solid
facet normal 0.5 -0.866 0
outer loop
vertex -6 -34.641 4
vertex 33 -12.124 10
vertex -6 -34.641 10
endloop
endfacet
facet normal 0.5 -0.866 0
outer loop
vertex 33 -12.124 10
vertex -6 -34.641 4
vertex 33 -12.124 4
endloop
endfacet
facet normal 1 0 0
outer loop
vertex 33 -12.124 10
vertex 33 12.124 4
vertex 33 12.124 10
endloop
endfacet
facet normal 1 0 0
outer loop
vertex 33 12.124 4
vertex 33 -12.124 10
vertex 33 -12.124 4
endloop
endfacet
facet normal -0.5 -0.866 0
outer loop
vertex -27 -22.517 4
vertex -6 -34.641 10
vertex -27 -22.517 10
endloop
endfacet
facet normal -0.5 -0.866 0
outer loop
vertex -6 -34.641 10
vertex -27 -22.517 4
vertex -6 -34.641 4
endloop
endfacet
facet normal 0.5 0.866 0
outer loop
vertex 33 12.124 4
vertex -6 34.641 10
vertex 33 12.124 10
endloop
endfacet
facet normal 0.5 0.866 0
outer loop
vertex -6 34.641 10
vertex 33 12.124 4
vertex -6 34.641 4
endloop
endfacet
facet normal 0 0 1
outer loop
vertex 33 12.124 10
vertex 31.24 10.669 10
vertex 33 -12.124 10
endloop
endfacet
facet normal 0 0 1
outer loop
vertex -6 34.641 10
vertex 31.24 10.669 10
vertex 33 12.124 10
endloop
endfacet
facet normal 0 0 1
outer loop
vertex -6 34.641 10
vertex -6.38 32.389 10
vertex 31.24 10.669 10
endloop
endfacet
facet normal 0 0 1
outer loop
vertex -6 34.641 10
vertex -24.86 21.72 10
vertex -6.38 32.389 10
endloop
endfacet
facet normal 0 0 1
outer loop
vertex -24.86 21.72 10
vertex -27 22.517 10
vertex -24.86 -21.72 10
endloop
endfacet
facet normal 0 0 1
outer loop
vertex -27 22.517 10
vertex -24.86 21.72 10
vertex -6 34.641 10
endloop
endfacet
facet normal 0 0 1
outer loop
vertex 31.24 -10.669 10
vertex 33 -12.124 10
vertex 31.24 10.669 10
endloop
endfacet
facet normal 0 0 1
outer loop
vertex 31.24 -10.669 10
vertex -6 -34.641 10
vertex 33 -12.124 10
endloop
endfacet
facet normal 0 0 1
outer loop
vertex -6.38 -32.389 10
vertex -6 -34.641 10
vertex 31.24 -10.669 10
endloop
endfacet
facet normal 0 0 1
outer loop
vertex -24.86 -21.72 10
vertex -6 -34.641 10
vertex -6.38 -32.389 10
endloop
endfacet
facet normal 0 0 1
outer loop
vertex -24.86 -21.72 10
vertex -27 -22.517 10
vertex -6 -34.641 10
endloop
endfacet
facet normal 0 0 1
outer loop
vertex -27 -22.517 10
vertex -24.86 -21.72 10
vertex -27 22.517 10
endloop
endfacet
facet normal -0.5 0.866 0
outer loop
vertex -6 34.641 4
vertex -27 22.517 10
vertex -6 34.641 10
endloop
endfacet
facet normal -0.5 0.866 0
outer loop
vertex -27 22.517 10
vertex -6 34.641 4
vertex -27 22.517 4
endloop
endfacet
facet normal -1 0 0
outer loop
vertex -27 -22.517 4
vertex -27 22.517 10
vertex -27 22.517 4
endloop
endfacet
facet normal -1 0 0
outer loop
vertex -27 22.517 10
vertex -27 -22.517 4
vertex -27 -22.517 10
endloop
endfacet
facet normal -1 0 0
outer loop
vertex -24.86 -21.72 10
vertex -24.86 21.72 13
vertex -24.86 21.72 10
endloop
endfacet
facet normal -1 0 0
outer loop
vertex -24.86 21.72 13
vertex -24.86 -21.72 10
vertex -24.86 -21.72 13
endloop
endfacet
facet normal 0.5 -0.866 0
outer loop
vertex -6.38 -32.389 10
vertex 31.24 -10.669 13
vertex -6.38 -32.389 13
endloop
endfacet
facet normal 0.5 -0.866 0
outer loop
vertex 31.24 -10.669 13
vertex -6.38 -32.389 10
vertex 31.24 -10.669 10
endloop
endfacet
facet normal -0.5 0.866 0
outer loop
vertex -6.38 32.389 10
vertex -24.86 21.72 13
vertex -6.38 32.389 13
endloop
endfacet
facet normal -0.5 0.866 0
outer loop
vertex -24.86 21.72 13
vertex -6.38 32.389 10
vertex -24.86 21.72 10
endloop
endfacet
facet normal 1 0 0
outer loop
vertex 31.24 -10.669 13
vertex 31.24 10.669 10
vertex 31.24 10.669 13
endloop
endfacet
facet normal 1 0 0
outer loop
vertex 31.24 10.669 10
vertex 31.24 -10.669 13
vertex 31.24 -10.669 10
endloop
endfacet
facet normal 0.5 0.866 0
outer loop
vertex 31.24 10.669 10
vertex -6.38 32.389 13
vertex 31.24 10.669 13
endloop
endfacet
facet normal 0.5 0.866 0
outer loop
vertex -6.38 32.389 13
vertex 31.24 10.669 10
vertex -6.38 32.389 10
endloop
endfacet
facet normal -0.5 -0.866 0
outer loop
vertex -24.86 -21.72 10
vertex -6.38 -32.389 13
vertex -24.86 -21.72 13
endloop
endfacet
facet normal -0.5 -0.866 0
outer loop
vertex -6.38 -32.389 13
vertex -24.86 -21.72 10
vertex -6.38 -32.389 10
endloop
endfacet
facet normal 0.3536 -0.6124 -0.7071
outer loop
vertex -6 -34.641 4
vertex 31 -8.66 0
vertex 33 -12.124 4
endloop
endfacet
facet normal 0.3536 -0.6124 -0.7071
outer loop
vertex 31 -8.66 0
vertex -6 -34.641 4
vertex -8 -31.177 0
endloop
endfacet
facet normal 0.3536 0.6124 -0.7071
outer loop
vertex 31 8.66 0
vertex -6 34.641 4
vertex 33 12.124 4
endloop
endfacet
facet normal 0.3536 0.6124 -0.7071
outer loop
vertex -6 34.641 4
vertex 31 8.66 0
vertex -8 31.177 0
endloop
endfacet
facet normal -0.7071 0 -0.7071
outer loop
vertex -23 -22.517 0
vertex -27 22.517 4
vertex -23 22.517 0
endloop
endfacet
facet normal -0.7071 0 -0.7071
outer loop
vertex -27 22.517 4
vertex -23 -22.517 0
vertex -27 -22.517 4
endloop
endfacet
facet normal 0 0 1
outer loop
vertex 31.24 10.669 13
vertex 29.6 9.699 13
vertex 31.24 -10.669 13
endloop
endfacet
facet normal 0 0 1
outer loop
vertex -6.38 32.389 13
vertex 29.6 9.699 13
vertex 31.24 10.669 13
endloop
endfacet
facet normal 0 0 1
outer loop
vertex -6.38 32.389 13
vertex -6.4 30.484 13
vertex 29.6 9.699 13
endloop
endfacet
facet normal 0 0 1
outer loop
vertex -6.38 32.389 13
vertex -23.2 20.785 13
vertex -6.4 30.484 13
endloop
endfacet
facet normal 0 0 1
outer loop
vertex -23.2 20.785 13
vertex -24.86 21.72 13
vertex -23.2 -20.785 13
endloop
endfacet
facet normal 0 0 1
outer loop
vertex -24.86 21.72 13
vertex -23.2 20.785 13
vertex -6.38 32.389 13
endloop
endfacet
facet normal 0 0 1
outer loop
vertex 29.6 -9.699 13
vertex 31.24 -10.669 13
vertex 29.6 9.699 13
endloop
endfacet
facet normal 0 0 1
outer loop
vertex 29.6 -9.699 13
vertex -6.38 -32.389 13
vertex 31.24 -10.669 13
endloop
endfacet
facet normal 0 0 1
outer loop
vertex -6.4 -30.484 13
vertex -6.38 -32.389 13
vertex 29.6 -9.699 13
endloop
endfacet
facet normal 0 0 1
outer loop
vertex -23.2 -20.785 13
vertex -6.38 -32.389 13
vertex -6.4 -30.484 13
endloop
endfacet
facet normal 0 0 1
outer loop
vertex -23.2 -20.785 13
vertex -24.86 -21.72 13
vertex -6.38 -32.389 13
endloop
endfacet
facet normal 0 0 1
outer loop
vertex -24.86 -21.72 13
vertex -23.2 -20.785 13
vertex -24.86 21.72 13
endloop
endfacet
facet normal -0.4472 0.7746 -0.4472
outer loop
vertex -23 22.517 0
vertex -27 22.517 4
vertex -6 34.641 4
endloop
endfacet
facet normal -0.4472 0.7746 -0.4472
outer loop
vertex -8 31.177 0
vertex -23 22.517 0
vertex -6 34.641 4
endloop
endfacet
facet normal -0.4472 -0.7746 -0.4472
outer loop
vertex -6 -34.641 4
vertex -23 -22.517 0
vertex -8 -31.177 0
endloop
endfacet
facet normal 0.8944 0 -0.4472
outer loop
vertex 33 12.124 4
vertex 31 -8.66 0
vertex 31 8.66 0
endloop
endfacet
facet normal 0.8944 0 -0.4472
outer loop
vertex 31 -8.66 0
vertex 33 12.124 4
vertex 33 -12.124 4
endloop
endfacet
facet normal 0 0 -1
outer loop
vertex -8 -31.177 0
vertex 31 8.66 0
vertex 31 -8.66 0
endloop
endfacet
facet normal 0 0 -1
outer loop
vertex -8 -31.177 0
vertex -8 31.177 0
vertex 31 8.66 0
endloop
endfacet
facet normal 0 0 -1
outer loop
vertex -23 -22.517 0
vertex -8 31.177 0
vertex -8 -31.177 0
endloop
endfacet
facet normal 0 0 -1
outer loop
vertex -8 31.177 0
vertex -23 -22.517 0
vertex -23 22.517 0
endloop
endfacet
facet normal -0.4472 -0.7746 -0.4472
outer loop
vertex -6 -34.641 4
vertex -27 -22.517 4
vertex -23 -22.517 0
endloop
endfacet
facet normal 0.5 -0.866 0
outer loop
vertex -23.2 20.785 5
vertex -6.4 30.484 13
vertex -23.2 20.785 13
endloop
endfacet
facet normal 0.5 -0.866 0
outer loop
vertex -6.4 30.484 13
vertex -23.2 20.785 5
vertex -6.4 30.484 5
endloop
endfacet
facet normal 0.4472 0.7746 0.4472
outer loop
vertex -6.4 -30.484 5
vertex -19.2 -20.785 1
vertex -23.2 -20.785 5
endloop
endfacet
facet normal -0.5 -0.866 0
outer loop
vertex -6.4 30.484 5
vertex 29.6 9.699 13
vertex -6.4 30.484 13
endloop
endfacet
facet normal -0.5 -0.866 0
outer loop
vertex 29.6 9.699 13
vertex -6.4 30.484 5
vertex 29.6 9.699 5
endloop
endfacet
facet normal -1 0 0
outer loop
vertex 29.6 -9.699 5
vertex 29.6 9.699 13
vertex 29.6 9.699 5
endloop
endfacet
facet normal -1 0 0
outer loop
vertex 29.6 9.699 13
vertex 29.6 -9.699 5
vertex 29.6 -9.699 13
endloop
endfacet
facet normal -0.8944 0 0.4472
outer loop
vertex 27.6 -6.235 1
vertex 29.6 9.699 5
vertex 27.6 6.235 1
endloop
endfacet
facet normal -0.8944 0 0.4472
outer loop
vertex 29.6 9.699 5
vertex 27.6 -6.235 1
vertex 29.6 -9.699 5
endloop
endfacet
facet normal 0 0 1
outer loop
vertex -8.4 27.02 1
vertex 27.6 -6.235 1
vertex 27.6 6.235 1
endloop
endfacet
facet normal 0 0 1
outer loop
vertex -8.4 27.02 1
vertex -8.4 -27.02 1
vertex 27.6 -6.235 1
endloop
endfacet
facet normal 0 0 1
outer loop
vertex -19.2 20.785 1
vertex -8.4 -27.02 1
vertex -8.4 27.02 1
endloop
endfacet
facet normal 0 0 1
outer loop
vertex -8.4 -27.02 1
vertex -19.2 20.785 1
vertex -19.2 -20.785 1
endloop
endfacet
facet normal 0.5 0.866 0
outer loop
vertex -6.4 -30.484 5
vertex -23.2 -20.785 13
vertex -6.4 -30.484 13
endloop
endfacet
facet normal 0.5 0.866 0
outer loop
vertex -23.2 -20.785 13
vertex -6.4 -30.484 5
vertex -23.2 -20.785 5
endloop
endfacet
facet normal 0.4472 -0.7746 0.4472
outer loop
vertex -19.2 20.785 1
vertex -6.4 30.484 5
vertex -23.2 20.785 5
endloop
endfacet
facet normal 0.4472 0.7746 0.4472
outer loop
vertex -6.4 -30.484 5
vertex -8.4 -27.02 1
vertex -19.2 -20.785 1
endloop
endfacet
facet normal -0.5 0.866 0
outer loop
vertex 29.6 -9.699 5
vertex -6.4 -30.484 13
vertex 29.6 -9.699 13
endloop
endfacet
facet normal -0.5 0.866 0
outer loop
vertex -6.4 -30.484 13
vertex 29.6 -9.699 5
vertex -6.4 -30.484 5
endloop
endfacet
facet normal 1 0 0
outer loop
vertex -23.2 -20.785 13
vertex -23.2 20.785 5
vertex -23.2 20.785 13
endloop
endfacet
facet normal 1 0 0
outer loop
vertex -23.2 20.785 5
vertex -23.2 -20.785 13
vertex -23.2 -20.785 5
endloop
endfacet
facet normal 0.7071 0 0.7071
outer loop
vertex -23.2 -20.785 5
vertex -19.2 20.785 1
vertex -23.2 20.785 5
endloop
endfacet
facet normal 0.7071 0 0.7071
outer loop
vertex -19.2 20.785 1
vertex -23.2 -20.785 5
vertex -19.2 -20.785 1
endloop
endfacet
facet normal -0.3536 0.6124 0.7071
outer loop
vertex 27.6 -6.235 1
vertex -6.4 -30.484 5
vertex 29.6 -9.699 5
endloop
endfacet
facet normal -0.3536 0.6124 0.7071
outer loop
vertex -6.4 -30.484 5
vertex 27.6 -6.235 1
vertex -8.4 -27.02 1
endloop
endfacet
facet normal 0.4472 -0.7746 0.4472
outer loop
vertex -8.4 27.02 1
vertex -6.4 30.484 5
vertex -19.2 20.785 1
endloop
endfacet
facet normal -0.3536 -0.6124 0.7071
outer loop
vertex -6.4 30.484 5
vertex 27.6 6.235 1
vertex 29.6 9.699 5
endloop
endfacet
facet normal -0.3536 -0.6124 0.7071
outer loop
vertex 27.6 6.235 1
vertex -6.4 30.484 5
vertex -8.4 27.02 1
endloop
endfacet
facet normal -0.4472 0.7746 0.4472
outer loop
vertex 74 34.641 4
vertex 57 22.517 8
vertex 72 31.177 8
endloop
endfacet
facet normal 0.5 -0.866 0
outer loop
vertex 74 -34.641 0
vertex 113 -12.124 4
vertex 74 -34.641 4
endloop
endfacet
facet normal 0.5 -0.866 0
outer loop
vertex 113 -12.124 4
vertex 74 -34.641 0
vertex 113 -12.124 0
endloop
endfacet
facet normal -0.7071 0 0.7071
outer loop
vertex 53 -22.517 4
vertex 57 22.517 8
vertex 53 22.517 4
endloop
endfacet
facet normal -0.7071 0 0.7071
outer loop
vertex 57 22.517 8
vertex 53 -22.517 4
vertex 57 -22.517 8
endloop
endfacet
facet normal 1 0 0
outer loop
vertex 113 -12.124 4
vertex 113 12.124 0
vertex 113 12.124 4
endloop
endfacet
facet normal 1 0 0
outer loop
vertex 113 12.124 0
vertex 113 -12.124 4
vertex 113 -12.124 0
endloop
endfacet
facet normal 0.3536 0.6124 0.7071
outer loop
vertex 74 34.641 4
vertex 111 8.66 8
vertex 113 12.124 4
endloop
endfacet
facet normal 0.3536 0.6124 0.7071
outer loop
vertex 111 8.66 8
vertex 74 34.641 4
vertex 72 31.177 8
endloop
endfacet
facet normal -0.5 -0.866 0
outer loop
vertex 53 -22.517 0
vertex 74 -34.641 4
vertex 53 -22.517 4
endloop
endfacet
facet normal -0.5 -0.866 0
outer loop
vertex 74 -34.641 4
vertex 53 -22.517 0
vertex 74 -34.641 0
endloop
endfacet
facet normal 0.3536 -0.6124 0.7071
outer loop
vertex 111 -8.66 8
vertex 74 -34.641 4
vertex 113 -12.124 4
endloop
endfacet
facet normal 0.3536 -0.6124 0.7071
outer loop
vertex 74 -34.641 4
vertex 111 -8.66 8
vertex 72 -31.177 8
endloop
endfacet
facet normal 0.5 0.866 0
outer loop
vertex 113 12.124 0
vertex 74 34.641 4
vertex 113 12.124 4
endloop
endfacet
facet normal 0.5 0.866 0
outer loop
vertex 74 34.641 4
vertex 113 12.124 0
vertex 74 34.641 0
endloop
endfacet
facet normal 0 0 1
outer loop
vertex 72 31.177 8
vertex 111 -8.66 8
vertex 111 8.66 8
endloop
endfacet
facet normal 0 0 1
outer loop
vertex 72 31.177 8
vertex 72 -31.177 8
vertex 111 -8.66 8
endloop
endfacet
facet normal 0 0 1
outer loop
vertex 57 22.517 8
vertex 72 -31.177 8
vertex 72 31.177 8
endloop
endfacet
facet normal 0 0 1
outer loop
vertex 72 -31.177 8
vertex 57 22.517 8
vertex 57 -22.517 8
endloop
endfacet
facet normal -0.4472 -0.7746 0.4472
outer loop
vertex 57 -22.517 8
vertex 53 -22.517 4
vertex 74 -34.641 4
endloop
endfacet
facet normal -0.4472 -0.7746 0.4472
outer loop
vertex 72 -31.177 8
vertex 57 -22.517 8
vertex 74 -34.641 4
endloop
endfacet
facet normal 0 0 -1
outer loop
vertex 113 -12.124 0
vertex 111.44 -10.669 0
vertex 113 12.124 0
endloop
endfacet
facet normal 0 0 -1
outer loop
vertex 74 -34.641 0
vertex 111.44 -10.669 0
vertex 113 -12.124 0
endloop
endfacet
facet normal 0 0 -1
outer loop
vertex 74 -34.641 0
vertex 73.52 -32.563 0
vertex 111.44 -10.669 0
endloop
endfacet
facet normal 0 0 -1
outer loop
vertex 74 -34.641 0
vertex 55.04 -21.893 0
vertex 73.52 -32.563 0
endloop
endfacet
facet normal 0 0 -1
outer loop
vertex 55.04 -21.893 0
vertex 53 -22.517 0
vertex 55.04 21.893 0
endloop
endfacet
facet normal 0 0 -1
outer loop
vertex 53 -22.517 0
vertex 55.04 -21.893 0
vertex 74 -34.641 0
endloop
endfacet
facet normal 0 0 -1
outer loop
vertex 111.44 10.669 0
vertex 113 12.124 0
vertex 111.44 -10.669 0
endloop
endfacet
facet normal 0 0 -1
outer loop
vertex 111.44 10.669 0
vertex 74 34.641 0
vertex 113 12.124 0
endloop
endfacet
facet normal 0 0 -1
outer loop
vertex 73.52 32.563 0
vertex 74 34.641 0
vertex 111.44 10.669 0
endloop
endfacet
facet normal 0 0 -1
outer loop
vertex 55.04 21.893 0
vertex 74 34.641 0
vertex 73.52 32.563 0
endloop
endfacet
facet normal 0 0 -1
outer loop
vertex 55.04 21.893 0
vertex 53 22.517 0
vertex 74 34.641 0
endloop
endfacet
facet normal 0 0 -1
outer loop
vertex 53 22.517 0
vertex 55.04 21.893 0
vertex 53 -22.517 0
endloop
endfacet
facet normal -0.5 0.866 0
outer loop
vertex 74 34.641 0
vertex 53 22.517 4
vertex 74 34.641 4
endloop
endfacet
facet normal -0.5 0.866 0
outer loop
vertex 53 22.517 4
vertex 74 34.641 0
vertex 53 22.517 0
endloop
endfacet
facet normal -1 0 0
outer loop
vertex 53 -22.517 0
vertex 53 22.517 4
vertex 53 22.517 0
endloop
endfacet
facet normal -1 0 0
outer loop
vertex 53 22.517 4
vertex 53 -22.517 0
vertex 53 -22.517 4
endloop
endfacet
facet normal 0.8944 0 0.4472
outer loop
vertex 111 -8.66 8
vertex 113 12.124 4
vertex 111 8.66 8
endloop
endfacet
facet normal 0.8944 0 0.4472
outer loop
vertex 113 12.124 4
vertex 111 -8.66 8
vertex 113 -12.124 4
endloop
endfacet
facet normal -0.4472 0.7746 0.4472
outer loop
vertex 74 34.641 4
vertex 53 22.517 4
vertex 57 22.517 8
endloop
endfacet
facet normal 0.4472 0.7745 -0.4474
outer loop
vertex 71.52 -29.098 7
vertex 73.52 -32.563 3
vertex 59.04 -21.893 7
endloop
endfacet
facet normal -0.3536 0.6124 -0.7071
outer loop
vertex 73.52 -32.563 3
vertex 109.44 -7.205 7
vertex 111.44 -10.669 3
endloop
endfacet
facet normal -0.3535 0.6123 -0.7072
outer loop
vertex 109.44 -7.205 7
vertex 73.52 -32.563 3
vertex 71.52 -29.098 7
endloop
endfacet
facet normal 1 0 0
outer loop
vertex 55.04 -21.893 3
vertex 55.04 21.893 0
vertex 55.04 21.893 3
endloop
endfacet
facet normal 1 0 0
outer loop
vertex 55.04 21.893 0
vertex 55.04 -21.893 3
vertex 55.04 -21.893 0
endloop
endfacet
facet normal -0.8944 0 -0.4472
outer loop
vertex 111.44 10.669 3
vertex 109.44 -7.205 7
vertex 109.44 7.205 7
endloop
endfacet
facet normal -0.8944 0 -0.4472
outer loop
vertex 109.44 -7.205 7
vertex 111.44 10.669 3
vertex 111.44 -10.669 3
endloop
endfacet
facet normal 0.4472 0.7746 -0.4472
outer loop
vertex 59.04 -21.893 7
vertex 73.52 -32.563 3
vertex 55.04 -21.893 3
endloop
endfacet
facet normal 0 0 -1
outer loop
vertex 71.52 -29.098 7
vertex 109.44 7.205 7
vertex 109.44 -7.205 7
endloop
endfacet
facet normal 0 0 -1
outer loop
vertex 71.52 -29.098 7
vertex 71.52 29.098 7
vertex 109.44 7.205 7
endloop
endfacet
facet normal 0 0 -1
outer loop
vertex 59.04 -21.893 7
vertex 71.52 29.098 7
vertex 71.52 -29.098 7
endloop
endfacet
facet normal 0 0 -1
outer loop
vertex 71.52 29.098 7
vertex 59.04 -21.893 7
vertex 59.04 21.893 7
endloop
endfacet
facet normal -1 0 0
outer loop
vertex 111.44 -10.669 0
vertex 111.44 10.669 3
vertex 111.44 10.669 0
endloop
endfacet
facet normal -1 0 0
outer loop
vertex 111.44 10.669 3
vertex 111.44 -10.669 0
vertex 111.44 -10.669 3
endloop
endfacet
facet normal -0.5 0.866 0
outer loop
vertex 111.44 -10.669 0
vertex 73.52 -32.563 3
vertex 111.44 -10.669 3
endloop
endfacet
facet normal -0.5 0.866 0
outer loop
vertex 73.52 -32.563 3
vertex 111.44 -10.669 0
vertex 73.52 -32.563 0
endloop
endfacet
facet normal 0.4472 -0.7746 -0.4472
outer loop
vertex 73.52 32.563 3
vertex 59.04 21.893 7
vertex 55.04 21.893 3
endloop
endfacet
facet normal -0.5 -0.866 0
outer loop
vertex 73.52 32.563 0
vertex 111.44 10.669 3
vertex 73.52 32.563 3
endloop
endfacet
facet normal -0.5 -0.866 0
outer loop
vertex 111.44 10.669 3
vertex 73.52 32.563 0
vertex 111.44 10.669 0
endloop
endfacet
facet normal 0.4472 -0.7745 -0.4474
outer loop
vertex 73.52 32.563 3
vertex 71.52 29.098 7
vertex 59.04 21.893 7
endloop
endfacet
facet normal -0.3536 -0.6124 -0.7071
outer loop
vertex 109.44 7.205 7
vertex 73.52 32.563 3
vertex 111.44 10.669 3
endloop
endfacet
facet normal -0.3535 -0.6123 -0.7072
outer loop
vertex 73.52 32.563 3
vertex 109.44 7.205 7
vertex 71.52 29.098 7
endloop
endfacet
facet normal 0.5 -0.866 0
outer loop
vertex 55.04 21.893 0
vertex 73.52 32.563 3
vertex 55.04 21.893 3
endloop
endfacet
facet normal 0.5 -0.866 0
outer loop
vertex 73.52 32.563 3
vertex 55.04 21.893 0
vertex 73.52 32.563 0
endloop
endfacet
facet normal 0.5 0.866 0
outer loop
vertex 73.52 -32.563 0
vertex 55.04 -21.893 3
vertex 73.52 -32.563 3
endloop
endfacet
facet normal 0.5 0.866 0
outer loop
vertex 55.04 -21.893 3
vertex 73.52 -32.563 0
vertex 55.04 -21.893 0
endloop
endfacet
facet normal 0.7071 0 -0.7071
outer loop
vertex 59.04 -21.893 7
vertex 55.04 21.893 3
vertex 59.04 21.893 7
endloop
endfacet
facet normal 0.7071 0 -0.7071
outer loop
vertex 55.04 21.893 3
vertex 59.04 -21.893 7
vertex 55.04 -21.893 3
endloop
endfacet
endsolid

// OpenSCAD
$fs = 0.1;

base_diam = 80;
base = 1;
body_wall = 4.8;
body_height = 13;

lid_wall = 2.4;
lid_height = 8;

bevel_rad = 14;
bottom_bevel_height = 4;
top_bevel_height = 4;
bevel_inset = 4;

lip_height = 3;
lip_tol = 0.2;

module body()
{
	module shape(diam, bevel_scale = 1)
	{
		minkowski()
		{
			br = bevel_rad * bevel_scale;
			cylinder(d = diam - br * 2, h = body_height - bottom_bevel_height, $fn = 3);
			rotate([0, 0, 180]) cylinder(r1 = br - bevel_inset, r2 = br, h = bottom_bevel_height, $fn = 3);	
		}
	}

	difference()
	{
		shape(base_diam);
		translate([0, 0, base]) shape(base_diam - body_wall * 2, 0.8);
		translate([0, 0, body_height - lip_height]) lid(lip_tol);
	}
}

module lid(wall_extra = 0)
{
	module shape(diam, bevel_scale = 1)
	{
		minkowski()
		{
			br = bevel_rad * bevel_scale;
			cylinder(d = diam - br * 2, h = lid_height - top_bevel_height, $fn = 3);
			rotate([0, 0, 180]) cylinder(r1 = br, r2 = br - bevel_inset, h = top_bevel_height, $fn = 3);	
		}
	}

	difference()
	{
		shape(base_diam);
		translate([0, 0, -base]) shape(base_diam - (lid_wall + wall_extra) * 2, 0.88);
	}
}

body(); 
//#translate([0, 0, body_height - lip_height]) lid();
translate([base_diam, 0, 0]) lid();
